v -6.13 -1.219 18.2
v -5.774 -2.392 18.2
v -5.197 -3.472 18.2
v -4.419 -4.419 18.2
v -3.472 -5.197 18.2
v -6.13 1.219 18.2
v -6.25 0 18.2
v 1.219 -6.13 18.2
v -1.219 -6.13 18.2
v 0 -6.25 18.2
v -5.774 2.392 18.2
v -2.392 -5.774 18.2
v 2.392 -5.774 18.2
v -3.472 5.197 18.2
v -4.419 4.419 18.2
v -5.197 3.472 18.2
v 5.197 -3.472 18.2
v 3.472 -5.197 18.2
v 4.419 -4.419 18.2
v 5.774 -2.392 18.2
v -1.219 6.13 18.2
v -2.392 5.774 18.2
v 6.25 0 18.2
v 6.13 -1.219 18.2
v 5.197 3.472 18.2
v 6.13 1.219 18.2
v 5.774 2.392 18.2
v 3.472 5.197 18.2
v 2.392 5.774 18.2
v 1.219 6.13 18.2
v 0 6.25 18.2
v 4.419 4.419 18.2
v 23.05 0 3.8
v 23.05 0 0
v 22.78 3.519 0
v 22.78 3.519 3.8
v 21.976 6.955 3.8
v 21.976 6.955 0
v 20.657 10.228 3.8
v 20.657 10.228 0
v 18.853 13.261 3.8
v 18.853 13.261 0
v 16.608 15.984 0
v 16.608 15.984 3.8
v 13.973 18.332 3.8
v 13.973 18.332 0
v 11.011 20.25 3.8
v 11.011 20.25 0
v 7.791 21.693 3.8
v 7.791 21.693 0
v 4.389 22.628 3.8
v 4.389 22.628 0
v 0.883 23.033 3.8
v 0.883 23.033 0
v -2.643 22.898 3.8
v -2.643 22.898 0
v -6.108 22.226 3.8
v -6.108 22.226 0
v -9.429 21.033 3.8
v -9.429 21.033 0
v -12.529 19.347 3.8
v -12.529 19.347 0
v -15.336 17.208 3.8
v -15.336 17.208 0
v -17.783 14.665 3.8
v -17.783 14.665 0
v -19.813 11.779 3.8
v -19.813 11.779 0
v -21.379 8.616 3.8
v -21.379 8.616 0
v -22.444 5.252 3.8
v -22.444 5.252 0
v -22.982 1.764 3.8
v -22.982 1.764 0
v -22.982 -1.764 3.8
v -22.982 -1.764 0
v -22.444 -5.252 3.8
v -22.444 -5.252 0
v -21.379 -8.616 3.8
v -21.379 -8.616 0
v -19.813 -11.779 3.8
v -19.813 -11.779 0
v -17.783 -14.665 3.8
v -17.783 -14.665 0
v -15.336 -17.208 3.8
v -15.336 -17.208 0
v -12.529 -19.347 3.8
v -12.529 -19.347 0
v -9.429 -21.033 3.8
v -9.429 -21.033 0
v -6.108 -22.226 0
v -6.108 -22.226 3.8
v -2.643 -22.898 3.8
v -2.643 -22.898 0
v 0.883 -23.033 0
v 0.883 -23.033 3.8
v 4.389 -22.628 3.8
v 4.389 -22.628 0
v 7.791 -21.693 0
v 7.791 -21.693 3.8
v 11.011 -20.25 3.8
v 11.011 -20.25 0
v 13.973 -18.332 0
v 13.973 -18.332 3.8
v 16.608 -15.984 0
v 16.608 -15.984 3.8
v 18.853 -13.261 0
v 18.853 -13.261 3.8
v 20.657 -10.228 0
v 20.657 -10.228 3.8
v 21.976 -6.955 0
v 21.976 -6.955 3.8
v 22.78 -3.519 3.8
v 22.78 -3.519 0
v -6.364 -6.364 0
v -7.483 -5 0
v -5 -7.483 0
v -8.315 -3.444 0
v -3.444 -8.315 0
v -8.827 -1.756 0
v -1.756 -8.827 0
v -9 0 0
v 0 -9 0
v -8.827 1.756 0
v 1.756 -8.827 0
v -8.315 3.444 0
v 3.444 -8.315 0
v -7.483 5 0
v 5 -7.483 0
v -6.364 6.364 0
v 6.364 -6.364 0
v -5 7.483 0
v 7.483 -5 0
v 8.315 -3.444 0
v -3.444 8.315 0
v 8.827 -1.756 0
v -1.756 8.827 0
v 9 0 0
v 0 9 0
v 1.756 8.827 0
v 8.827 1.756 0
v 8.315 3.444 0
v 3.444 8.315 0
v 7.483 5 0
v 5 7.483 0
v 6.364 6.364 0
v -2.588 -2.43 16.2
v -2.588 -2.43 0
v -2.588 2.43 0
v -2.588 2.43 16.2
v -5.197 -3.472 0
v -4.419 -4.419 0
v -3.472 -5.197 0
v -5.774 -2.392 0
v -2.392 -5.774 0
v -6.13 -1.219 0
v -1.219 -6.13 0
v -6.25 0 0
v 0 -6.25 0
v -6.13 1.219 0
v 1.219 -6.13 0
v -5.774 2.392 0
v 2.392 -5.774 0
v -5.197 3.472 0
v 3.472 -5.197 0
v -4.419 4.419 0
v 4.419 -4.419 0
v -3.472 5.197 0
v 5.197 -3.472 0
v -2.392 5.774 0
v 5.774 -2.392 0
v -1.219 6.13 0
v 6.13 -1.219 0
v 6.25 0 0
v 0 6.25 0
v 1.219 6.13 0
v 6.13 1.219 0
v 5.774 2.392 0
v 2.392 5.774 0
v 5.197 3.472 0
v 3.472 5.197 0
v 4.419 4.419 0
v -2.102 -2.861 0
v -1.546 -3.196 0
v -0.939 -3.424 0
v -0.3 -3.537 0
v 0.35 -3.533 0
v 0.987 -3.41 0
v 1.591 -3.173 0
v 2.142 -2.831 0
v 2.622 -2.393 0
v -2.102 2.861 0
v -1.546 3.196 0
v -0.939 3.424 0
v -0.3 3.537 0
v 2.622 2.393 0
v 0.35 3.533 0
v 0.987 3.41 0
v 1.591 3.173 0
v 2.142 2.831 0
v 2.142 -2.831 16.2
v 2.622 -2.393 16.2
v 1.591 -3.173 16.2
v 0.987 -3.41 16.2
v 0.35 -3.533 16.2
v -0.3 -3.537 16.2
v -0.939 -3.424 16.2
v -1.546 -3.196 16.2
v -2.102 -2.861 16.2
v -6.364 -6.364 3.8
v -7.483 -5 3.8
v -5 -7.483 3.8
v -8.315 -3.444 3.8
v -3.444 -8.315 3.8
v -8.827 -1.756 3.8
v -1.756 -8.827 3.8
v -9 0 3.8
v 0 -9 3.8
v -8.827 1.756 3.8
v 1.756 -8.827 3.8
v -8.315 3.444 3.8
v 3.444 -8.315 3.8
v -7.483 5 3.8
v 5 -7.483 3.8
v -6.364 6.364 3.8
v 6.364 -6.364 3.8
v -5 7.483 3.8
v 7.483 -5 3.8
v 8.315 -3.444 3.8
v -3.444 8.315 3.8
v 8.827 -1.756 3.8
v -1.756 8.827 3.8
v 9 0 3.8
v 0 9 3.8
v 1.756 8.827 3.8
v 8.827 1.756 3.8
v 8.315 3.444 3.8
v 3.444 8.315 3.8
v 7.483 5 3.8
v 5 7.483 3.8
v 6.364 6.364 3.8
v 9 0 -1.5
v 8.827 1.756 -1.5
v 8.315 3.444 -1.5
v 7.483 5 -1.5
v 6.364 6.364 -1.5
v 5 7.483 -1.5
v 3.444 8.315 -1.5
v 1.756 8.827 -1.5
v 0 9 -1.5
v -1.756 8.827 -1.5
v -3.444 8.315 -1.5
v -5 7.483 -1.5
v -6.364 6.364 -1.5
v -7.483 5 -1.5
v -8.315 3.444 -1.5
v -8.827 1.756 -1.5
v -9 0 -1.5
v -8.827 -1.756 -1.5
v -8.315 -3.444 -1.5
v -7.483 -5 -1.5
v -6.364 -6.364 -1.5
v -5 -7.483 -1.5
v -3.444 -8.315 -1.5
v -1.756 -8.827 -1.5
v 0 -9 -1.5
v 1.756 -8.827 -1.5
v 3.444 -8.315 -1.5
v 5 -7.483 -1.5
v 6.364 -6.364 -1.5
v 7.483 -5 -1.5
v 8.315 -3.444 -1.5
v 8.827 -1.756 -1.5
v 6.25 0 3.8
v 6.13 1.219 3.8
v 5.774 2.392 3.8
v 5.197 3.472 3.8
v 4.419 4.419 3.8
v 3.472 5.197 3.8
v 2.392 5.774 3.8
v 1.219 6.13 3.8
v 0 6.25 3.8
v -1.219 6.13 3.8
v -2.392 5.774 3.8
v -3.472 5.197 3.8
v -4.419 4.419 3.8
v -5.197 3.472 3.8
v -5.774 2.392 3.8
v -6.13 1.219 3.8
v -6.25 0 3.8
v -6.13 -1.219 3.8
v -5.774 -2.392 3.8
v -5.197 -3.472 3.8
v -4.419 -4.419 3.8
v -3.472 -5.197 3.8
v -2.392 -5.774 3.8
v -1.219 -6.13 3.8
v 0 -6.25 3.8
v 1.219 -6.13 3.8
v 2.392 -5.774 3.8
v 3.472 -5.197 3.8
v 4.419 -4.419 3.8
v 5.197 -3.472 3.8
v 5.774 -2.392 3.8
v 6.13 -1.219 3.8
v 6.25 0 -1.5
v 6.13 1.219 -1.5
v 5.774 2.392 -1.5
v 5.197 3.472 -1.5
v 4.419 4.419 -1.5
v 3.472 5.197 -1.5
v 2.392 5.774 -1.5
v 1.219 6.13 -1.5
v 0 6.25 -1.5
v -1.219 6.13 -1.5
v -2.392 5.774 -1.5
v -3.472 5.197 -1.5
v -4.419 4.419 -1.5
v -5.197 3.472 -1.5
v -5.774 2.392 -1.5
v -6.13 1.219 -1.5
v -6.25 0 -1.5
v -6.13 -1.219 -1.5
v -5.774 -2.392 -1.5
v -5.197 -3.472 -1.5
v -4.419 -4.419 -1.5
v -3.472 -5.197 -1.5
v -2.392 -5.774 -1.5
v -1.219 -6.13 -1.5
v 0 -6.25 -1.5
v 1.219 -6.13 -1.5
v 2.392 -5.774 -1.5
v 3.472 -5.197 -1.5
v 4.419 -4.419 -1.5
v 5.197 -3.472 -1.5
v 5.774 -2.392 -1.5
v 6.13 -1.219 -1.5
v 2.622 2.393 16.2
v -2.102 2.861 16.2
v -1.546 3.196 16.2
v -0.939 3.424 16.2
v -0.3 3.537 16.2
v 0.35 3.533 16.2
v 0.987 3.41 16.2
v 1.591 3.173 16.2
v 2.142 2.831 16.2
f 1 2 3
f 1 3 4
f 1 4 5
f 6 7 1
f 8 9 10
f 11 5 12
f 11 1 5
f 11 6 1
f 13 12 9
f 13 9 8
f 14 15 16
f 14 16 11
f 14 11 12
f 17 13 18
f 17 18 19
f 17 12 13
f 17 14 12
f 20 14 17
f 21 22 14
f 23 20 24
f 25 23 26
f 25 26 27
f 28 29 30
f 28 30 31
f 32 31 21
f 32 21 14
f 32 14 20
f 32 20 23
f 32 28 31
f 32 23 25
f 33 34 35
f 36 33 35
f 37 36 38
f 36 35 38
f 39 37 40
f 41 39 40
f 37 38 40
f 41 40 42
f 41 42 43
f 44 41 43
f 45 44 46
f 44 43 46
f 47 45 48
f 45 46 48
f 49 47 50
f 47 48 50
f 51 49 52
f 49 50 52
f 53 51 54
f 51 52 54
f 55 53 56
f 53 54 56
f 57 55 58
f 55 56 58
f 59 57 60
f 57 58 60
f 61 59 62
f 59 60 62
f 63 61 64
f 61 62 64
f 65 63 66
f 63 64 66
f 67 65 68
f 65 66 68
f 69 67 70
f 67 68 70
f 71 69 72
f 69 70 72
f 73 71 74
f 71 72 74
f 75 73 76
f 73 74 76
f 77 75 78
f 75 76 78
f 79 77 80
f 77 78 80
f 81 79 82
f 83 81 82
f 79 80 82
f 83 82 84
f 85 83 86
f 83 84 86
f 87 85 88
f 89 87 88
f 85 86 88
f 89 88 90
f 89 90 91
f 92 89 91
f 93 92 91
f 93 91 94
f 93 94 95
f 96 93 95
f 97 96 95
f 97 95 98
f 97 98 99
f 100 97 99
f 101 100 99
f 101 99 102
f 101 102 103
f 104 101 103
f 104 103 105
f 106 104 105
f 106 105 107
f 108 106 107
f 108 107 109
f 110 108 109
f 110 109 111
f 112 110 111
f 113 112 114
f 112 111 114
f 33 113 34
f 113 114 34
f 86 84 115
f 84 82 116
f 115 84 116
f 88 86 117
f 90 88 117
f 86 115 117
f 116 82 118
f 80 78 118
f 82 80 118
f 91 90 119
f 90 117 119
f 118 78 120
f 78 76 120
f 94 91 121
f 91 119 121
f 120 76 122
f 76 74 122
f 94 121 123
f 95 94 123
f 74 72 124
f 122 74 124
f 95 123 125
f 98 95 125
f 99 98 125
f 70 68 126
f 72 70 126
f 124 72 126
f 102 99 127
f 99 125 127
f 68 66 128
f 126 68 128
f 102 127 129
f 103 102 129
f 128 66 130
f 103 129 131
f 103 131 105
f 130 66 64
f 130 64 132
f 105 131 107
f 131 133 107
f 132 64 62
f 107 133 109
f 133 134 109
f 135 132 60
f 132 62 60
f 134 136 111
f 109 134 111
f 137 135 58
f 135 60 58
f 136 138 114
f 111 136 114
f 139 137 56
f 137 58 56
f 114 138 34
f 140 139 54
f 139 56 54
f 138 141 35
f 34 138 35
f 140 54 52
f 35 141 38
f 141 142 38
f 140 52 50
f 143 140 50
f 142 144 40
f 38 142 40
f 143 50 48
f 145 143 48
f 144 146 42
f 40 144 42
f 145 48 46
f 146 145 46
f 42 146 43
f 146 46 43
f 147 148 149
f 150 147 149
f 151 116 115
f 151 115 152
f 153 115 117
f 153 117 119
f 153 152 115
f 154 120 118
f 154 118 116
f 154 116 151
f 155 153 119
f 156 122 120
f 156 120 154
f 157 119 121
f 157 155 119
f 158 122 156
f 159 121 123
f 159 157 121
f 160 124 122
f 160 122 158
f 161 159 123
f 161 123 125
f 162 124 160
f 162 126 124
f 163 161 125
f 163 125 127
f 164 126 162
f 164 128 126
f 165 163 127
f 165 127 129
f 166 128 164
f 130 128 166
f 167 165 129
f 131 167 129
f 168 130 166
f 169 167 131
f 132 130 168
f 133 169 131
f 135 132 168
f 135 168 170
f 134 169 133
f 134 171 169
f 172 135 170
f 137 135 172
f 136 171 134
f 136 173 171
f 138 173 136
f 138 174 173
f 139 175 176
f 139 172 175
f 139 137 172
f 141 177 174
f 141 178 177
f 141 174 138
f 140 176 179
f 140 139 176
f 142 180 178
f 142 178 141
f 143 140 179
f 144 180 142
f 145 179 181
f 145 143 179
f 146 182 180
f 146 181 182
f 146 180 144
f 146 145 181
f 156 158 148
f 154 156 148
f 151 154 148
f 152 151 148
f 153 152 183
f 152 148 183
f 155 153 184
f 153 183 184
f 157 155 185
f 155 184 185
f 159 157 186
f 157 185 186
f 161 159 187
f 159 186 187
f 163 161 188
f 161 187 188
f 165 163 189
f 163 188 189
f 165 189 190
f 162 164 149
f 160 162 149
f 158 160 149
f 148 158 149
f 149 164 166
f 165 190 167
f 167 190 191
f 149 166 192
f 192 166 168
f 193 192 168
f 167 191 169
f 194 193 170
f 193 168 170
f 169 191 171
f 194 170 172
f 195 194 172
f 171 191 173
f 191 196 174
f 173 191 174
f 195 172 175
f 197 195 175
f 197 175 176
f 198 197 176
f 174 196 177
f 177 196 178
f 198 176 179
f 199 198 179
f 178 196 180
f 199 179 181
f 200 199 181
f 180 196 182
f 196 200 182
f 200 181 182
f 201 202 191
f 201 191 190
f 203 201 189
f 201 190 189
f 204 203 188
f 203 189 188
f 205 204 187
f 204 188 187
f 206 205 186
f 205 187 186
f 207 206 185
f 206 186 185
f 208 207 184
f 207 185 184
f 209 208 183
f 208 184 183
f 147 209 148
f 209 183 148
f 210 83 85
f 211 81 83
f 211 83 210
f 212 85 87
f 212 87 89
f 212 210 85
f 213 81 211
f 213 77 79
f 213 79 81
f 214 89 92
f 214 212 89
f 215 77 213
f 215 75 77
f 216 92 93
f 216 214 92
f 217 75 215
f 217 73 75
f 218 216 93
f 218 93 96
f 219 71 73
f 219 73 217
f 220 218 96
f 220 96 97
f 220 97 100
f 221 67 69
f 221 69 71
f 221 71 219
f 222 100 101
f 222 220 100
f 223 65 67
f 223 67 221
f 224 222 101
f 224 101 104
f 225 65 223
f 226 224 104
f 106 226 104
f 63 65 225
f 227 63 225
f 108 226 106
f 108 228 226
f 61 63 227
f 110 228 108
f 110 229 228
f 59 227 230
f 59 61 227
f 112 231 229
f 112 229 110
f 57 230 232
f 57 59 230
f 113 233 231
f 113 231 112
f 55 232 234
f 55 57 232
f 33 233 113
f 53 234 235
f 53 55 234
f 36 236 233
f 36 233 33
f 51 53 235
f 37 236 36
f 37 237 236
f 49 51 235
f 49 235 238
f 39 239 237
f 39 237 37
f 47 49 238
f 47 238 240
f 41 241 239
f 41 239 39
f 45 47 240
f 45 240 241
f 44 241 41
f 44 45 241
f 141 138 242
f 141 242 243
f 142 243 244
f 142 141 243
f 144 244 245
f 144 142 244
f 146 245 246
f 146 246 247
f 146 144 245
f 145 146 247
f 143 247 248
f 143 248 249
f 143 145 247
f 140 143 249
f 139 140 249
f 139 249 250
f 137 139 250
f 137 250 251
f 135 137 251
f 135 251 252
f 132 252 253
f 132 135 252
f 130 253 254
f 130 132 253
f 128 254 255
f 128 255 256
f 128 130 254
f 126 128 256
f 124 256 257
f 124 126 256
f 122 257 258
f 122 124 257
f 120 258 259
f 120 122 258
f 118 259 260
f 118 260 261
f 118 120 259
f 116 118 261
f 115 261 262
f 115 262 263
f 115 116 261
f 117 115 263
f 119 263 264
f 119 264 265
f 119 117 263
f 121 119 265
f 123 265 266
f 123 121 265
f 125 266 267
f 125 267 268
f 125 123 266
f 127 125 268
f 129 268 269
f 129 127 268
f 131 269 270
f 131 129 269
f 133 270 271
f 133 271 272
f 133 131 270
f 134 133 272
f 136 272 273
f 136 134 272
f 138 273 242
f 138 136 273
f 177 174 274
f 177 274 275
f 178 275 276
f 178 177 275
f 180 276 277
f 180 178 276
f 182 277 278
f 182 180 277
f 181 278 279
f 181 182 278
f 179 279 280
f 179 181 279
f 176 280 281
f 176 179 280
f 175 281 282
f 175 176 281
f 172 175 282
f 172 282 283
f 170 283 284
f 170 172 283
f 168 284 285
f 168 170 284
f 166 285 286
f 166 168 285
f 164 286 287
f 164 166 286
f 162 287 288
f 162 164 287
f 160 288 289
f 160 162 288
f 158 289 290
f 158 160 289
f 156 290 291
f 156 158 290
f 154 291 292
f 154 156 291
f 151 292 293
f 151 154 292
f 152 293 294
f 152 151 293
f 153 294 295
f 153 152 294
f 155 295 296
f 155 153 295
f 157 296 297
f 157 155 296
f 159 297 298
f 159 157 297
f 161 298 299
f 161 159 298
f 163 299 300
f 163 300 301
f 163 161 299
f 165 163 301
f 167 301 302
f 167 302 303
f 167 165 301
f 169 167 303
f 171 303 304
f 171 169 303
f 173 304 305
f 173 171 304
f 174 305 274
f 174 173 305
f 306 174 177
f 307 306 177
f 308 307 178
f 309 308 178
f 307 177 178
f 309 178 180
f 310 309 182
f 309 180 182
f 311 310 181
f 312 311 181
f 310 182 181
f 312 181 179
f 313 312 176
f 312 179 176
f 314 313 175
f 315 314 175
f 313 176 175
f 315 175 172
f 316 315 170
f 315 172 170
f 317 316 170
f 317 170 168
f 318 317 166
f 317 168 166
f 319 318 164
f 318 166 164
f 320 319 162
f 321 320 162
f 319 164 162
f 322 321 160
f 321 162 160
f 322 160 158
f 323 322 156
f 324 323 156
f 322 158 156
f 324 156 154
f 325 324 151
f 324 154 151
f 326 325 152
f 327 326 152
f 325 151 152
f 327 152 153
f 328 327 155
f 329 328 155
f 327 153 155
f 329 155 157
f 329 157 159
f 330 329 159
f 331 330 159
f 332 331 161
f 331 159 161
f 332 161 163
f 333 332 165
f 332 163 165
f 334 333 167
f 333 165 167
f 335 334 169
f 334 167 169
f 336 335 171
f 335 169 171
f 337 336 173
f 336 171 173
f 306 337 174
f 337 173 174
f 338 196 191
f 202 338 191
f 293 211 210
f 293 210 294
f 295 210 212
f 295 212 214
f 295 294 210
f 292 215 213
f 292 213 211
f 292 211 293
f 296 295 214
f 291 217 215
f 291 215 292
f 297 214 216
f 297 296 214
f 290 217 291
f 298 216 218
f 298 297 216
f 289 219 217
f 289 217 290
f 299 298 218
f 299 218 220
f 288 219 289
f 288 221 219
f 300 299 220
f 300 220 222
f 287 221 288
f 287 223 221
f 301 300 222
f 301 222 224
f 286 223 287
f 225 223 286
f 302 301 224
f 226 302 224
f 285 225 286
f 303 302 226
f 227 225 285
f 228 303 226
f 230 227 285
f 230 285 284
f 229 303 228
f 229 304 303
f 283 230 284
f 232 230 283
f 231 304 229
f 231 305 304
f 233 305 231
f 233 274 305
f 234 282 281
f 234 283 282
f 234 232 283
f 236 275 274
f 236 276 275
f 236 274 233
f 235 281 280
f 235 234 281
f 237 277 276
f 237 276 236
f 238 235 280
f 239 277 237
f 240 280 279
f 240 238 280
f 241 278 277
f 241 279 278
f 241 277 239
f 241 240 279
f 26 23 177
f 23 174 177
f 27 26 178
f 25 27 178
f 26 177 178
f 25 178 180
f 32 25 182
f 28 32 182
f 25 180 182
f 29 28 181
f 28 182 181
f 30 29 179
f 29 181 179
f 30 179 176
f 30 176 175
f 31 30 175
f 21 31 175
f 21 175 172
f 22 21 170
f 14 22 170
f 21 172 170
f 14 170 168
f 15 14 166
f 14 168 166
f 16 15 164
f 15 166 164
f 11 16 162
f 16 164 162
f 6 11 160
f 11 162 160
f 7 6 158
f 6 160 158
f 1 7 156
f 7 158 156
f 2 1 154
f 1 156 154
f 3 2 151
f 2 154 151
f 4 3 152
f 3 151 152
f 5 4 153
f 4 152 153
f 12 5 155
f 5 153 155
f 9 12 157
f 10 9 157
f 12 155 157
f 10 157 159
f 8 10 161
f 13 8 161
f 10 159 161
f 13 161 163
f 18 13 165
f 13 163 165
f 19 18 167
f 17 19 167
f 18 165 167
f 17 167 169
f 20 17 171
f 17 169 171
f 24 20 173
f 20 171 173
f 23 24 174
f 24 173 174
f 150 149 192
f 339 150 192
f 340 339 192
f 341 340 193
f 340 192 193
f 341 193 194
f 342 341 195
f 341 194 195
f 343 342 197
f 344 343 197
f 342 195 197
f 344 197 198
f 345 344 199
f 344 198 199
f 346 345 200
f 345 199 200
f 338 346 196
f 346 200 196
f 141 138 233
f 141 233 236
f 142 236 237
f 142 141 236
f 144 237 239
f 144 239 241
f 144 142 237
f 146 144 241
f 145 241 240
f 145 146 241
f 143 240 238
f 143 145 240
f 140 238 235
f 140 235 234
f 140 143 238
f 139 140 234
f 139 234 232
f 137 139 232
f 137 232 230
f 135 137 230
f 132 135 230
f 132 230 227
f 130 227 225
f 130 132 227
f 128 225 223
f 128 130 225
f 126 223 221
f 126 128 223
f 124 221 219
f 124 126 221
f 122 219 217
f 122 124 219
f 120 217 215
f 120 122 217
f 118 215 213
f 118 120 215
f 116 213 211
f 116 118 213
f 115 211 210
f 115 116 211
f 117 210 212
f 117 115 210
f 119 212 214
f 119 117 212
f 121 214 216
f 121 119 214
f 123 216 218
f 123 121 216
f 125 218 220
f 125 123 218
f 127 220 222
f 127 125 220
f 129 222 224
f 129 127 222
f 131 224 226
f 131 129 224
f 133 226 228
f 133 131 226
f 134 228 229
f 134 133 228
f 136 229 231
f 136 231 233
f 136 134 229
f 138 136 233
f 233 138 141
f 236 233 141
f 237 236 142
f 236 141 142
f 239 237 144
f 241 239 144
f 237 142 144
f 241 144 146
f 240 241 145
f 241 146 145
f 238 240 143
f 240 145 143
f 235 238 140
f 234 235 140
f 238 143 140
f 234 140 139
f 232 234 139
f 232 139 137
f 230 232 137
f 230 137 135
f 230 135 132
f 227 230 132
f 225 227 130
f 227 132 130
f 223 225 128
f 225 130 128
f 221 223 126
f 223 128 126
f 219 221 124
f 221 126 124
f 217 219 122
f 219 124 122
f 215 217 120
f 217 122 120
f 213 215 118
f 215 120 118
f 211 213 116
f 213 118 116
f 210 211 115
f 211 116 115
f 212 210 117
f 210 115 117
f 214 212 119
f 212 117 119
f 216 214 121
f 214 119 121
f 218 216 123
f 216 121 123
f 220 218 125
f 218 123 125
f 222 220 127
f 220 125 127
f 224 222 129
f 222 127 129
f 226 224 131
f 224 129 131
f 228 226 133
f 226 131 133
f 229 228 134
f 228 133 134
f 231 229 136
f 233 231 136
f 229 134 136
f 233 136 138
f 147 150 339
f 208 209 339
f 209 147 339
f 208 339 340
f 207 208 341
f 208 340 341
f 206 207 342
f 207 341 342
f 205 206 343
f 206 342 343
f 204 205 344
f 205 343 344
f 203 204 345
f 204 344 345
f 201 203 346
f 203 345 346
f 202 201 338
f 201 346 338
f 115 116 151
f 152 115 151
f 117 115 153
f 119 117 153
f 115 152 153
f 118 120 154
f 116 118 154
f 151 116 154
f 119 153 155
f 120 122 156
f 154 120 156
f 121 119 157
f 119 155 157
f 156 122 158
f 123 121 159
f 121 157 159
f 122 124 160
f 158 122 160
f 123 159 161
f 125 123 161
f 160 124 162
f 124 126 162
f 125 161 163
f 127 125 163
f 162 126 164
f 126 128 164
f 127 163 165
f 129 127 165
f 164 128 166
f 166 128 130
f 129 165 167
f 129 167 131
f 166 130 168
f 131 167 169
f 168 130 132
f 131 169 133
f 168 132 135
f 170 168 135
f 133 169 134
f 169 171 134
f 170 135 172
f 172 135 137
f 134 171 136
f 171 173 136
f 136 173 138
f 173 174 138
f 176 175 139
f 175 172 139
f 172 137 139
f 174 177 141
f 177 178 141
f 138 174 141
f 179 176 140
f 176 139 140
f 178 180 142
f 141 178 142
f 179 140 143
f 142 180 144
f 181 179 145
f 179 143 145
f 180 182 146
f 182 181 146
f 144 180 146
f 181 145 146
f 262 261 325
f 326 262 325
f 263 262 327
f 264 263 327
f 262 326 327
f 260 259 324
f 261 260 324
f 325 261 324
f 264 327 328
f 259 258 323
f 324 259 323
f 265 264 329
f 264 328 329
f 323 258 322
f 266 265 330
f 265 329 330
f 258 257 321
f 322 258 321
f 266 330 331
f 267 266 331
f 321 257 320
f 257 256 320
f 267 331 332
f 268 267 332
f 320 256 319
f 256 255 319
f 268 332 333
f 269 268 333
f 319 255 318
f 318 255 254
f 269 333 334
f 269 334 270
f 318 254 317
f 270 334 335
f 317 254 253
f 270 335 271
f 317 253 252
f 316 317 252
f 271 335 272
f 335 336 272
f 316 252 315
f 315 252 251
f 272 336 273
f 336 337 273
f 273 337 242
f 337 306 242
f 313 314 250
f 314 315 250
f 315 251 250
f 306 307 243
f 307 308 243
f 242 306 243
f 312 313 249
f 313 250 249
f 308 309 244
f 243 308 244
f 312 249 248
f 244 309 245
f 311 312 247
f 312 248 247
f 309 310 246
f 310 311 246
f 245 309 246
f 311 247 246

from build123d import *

# Parameters (mm, degrees)
F0_R     = 6.25
F1_DEPTH = 16.2
F0_R_2   = 23.05
F0_R_3   = 9
F2_DEPTH = 3.8
F3_DEPTH = 1.5
F4_DEPTH = 3.8
F5_R     = 6.25
F6_DEPTH = 2


with BuildPart() as f1:
    # F0 (on Top) → F1 (new body)
    with BuildSketch(Plane.XY):
        Circle(F0_R)
        with BuildLine():
            ThreePointArc((2.622066, -2.393171), (0.025069, -3.549911), (-2.588006, -2.429964))
            Line((-2.588006, -2.429964), (-2.588006, 2.429964))
            ThreePointArc((-2.588006, 2.429964), (0.025069, 3.549911), (2.622066, 2.393171))
            Line((2.622066, 2.393171), (2.622066, -2.393171))
        make_face(mode=Mode.SUBTRACT)
    extrude(amount=F1_DEPTH)

    # F5 (on face) → F6 (join)
    with BuildSketch(Plane.XY.offset(16.2)):
        Circle(F5_R)
        with BuildLine():
            ThreePointArc((-2.588006, 2.429964), (0.025069, 3.549911), (2.622066, 2.393171))
            Line((2.622066, 2.393171), (2.622066, -2.393171))
            ThreePointArc((2.622066, -2.393171), (0.025069, -3.549911), (-2.588006, -2.429964))
            Line((-2.588006, -2.429964), (-2.588006, 2.429964))
        make_face(mode=Mode.SUBTRACT)
        with BuildLine():
            Line((2.622066, -2.393171), (2.622066, 2.393171))
            ThreePointArc((2.622066, 2.393171), (0.025069, 3.549911), (-2.588006, 2.429964))
            Line((-2.588006, 2.429964), (-2.588006, -2.429964))
            ThreePointArc((-2.588006, -2.429964), (0.025069, -3.549911), (2.622066, -2.393171))
        make_face()
    extrude(amount=F6_DEPTH)


with BuildPart() as f2:
    # F0 (on Top) → F2 (new body)
    with BuildSketch(Plane.XY):
        Circle(F0_R_2)
        Circle(F0_R_3, mode=Mode.SUBTRACT)
    extrude(amount=F2_DEPTH)


with BuildPart() as f3:
    # F0 (on Top) → F3 (new body)
    with BuildSketch(Plane.XY):
        Circle(F0_R_3)
        Circle(F0_R, mode=Mode.SUBTRACT)
    extrude(amount=-F3_DEPTH)


with BuildPart() as f4:
    # F0 (on Top) → F4 (new body)
    with BuildSketch(Plane.XY):
        Circle(F0_R_3)
        Circle(F0_R, mode=Mode.SUBTRACT)
    extrude(amount=F4_DEPTH)


solid = Compound([f1.part, f2.part, f3.part, f4.part])
